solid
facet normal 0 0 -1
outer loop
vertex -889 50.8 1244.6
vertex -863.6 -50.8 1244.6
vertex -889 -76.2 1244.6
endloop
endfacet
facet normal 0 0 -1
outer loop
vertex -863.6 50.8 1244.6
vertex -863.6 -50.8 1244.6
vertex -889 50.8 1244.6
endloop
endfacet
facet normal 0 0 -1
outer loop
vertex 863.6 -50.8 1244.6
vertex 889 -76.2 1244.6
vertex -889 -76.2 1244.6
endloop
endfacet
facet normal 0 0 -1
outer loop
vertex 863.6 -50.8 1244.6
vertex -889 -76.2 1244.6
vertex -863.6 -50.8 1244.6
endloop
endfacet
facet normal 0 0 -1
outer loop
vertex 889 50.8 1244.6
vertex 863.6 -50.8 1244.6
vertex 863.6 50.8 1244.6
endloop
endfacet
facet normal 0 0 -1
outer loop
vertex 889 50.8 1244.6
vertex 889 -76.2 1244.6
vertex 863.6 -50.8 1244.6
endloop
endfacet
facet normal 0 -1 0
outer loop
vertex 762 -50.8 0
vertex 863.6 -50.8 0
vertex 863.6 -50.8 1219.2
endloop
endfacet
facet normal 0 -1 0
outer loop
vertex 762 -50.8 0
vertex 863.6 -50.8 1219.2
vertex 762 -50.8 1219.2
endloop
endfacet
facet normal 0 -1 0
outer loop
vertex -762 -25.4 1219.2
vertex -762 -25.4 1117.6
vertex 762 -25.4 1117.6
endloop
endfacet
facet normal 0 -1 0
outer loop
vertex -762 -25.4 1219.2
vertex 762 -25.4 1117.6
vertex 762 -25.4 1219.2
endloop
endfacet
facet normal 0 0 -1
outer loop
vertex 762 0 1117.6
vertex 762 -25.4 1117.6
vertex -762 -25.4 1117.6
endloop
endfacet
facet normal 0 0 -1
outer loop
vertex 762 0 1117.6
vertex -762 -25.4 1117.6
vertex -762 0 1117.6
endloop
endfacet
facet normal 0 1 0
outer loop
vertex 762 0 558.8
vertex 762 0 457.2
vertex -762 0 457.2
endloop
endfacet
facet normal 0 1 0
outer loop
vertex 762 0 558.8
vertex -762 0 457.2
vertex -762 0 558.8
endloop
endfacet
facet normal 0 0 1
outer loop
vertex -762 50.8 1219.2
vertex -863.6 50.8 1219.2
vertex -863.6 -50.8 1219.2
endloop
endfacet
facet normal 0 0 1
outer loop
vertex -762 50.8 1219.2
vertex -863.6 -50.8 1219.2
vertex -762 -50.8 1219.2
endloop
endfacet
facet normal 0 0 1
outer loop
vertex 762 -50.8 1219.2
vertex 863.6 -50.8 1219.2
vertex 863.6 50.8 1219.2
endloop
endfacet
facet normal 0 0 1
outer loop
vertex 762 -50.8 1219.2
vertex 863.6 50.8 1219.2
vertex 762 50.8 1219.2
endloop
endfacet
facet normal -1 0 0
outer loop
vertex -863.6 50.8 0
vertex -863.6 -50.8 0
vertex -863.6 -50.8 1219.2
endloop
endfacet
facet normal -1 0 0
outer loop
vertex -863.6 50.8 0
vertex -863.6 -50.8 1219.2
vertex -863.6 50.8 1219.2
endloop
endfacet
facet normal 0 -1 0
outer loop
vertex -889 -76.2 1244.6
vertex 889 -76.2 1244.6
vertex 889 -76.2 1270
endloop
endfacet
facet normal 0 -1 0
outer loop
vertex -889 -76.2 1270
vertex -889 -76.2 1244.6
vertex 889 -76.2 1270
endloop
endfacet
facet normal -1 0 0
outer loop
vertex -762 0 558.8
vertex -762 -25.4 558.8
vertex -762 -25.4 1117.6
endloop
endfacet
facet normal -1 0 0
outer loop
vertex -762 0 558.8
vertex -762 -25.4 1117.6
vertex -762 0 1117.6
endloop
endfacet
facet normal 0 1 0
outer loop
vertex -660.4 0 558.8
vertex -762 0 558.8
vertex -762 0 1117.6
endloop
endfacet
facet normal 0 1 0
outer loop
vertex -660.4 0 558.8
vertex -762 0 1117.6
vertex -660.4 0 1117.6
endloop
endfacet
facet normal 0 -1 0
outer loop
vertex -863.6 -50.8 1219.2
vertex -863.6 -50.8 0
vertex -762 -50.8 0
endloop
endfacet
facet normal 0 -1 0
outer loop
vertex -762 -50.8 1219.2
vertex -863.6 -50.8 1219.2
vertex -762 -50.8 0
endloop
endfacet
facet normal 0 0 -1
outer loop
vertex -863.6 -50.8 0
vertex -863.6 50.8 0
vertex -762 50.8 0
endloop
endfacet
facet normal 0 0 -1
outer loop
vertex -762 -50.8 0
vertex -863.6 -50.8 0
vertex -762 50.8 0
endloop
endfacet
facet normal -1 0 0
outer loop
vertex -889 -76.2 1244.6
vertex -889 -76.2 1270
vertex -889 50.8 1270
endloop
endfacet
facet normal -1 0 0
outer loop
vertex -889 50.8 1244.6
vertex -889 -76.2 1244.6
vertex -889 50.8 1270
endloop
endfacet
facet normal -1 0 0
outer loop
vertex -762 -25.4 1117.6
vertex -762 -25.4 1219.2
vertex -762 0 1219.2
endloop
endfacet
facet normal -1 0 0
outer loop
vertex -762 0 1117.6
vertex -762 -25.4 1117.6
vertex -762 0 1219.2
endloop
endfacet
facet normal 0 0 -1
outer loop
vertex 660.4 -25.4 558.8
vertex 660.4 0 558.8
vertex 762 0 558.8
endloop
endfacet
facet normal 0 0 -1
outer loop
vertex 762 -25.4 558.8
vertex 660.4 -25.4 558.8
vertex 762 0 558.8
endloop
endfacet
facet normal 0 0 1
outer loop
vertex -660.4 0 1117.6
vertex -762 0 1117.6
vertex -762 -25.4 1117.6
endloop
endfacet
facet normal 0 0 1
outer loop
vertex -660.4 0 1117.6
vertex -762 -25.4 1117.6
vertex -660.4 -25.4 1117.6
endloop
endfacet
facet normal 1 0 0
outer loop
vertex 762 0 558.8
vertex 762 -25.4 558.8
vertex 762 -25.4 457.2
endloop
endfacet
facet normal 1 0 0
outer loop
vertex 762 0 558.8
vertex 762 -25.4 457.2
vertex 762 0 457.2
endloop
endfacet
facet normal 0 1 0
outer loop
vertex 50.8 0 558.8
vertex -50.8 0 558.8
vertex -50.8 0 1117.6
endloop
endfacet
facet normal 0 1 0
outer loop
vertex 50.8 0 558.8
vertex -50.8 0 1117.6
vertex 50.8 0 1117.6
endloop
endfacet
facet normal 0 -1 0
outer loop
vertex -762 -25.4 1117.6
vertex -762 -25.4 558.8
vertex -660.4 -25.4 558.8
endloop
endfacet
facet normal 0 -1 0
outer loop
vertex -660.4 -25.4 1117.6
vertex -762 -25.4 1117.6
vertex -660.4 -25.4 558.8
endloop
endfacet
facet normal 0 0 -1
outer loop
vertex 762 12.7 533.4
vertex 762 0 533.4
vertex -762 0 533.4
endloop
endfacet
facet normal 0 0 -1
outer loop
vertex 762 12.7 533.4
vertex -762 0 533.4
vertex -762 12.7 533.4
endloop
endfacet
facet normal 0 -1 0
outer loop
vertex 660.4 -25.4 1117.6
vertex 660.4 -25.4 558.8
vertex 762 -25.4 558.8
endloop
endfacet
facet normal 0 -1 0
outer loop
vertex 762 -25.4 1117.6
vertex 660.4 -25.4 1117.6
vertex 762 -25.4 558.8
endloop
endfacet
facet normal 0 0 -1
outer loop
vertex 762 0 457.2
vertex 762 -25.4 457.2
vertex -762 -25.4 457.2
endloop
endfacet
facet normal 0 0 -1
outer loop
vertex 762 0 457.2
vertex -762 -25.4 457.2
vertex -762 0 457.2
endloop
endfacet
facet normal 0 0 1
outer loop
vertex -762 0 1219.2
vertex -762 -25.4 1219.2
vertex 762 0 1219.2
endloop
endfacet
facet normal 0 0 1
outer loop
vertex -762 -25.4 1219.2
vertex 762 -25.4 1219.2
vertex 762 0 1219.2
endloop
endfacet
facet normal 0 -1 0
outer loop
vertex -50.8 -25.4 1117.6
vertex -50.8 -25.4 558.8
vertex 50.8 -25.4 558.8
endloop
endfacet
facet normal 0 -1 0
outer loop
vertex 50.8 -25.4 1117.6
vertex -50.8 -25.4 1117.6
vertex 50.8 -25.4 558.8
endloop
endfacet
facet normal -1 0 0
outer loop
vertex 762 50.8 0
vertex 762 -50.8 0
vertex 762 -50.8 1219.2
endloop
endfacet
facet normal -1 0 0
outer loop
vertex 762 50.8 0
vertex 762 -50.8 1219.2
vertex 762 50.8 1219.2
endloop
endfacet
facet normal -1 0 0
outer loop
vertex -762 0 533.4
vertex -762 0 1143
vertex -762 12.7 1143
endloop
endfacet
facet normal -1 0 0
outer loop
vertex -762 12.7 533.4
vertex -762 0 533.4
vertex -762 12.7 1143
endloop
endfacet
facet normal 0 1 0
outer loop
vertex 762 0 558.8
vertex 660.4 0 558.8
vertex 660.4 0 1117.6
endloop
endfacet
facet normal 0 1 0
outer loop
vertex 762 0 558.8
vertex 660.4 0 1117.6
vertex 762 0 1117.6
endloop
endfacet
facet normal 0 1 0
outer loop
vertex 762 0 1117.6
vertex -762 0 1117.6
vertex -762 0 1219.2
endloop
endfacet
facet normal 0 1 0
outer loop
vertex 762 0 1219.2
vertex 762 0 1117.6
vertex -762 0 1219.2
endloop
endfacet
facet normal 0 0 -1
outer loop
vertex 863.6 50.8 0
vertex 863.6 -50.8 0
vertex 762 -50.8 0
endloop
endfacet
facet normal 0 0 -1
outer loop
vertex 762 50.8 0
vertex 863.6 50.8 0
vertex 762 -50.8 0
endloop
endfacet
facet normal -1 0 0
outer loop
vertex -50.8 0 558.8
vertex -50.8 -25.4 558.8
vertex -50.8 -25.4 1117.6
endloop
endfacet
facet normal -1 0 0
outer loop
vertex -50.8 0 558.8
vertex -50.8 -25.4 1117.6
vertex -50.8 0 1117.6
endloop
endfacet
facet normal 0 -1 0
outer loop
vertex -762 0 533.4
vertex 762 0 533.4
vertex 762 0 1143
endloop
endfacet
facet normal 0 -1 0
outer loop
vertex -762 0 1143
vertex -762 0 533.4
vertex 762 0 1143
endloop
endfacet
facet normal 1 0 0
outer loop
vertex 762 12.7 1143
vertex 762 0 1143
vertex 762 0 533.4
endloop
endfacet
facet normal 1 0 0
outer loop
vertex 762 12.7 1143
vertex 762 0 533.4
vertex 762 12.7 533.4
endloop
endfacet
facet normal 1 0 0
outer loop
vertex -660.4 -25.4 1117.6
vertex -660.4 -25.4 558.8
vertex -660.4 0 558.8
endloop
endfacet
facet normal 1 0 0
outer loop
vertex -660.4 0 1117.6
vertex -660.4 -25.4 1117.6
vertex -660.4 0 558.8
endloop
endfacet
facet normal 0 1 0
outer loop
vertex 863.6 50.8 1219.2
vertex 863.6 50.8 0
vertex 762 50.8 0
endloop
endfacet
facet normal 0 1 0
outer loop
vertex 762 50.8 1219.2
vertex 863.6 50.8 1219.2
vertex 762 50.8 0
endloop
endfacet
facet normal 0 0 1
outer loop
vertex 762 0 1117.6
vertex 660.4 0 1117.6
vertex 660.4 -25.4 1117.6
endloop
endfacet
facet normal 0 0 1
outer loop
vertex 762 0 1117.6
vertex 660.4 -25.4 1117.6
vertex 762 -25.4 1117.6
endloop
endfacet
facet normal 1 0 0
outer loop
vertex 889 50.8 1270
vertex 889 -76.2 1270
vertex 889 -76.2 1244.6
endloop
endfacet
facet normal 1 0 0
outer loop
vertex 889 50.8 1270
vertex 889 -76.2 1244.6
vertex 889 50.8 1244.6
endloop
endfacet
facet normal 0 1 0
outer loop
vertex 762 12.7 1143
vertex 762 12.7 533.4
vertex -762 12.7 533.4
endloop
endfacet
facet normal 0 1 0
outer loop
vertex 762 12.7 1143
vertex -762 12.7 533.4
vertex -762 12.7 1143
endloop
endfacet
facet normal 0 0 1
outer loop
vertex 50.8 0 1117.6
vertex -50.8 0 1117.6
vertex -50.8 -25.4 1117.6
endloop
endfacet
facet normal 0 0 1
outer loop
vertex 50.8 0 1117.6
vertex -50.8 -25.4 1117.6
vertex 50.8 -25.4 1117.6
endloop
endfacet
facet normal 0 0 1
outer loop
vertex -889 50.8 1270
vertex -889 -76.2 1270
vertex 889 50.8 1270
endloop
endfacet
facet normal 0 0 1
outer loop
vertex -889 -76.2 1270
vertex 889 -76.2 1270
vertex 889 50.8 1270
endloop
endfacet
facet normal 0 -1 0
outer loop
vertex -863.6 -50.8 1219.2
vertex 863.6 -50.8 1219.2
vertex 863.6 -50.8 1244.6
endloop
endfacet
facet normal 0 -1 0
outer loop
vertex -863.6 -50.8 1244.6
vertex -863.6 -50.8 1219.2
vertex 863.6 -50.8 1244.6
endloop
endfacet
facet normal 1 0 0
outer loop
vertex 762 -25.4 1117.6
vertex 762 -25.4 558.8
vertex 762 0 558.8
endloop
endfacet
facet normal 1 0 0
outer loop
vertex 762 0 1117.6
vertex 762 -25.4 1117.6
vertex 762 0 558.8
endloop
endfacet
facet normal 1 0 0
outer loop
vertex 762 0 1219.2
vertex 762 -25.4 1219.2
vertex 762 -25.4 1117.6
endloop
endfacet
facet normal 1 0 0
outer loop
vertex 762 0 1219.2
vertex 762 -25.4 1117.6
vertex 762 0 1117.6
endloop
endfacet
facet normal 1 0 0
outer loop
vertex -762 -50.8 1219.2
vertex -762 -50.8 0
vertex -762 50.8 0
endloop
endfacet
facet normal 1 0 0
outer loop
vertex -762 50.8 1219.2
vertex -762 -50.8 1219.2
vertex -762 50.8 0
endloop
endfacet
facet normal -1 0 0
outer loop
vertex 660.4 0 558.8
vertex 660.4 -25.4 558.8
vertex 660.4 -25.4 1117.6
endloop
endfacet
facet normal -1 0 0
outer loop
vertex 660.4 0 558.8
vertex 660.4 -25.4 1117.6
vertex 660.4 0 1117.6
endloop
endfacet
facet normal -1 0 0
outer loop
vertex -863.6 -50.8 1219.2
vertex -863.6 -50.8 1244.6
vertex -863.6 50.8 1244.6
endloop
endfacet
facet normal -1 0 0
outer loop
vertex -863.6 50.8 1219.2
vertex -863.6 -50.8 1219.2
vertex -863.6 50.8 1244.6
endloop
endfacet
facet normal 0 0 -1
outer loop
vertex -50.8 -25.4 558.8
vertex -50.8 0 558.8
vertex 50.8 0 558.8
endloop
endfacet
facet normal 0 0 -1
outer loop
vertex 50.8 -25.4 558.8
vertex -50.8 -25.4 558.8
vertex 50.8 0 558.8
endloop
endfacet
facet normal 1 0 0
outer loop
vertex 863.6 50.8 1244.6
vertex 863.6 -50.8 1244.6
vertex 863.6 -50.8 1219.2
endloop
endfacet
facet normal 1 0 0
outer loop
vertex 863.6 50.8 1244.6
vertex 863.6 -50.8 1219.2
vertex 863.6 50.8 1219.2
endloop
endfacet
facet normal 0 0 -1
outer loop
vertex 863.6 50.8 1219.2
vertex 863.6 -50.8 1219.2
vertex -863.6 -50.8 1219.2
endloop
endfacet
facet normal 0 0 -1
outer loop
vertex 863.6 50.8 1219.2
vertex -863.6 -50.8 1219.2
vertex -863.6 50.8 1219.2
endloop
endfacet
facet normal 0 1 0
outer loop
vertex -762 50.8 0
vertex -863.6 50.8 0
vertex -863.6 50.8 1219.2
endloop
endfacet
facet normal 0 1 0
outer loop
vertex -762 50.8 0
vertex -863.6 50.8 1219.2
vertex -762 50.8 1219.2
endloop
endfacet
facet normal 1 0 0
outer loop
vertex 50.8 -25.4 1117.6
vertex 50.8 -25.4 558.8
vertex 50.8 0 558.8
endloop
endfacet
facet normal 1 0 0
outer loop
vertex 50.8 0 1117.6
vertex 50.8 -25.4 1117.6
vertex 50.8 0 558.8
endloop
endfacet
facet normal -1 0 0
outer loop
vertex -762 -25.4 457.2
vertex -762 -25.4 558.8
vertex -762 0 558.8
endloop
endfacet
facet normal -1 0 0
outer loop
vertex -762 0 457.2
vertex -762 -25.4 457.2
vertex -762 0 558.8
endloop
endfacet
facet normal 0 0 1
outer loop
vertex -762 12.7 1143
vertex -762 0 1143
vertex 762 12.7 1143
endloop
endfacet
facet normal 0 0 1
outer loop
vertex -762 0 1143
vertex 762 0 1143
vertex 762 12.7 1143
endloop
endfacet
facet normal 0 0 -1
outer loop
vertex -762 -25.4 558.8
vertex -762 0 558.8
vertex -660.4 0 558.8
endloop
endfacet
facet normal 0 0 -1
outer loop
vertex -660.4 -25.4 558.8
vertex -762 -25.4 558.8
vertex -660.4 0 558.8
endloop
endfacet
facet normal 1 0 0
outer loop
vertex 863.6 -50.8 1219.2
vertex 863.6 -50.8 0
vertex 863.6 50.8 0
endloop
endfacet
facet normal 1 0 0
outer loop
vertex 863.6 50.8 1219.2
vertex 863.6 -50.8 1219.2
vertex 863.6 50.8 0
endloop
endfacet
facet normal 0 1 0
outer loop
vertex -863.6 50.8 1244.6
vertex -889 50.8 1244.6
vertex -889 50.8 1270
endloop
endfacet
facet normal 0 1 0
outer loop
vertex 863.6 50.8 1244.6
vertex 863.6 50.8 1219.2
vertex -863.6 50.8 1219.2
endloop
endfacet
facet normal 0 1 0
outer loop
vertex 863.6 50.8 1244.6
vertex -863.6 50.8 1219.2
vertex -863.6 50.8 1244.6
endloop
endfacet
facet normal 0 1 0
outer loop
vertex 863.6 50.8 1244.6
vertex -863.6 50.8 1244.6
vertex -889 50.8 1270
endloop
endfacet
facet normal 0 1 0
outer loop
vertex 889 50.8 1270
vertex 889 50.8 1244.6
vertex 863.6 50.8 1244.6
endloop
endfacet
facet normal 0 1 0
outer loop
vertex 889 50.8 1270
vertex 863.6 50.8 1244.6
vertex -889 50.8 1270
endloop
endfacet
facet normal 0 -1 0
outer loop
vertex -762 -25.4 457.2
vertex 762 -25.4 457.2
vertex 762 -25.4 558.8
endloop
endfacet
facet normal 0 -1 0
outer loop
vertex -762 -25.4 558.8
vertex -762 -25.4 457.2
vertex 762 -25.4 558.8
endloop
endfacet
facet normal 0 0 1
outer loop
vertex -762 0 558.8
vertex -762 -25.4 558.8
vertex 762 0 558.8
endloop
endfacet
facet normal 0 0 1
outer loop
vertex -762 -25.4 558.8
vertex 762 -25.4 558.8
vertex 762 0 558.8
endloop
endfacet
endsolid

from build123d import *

# Parameters (mm, degrees)
F0_W      = 101.6
F0_H      = 101.6
F1_DEPTH  = 1219.2
F3_W      = 25.4
F3_H      = 101.6
F4_DEPTH  = 762
F5_W      = 25.4
F5_H      = 101.6
F6_DEPTH  = 762
F7_W      = 12.7
F7_H      = 609.6
F8_DEPTH  = 762
F9_W      = 101.6
F9_H      = 25.4
F10_DEPTH = 558.8
F11_W     = 101.6
F11_H     = 25.4
F12_DEPTH = 863.6
F13_W     = 127
F13_H     = 25.4
F14_DEPTH = 889


with BuildPart() as f1:
    # F0 (on Top) → F1 (new body)
    with BuildSketch(Plane.XY):
        with Locations((-812.8, 0)):
            Rectangle(F0_W, F0_H)
    extrude(amount=F1_DEPTH)


with BuildPart() as f2_1:
    # F2: instance of F1
    add(f1.part.mirror(Plane.YZ))


with BuildPart() as f4:
    # F3 (on Right) → F4 (new body, symmetric)
    with BuildSketch(Plane.YZ):
        with Locations((-12.7, 1168.4)):
            Rectangle(F3_W, F3_H)
    extrude(amount=F4_DEPTH, both=True)


with BuildPart() as f6:
    # F5 (on Right) → F6 (new body, symmetric)
    with BuildSketch(Plane.YZ):
        with Locations((-12.7, 508)):
            Rectangle(F5_W, F5_H)
    extrude(amount=F6_DEPTH, both=True)


with BuildPart() as f8:
    # F7 (on Right) → F8 (new body, symmetric)
    with BuildSketch(Plane.YZ):
        with Locations((6.35, 838.2)):
            Rectangle(F7_W, F7_H)
    extrude(amount=F8_DEPTH, both=True)


with BuildPart() as f10:
    # F9 (on face) → F10 (new body)
    with BuildSketch(Plane.XY.offset(558.8)):
        with Locations((-711.2, -12.7)):
            Rectangle(F9_W, F9_H)
        with Locations((711.2, -12.7)):
            Rectangle(F9_W, F9_H)
        with Locations((0, -12.7)):
            Rectangle(F9_W, F9_H)
    extrude(amount=F10_DEPTH)


with BuildPart() as f12:
    # F11 (on Right) → F12 (new body, symmetric)
    with BuildSketch(Plane.YZ):
        with Locations((0, 1231.9)):
            Rectangle(F11_W, F11_H)
    extrude(amount=F12_DEPTH, both=True)

    # F13 (on Right) → F14 (join, symmetric)
    with BuildSketch(Plane.YZ):
        with Locations((-12.7, 1257.3)):
            Rectangle(F13_W, F13_H)
    extrude(amount=F14_DEPTH, both=True)


solid = Compound([f1.part, f2_1.part, f4.part, f6.part, f8.part, f10.part, f12.part])
